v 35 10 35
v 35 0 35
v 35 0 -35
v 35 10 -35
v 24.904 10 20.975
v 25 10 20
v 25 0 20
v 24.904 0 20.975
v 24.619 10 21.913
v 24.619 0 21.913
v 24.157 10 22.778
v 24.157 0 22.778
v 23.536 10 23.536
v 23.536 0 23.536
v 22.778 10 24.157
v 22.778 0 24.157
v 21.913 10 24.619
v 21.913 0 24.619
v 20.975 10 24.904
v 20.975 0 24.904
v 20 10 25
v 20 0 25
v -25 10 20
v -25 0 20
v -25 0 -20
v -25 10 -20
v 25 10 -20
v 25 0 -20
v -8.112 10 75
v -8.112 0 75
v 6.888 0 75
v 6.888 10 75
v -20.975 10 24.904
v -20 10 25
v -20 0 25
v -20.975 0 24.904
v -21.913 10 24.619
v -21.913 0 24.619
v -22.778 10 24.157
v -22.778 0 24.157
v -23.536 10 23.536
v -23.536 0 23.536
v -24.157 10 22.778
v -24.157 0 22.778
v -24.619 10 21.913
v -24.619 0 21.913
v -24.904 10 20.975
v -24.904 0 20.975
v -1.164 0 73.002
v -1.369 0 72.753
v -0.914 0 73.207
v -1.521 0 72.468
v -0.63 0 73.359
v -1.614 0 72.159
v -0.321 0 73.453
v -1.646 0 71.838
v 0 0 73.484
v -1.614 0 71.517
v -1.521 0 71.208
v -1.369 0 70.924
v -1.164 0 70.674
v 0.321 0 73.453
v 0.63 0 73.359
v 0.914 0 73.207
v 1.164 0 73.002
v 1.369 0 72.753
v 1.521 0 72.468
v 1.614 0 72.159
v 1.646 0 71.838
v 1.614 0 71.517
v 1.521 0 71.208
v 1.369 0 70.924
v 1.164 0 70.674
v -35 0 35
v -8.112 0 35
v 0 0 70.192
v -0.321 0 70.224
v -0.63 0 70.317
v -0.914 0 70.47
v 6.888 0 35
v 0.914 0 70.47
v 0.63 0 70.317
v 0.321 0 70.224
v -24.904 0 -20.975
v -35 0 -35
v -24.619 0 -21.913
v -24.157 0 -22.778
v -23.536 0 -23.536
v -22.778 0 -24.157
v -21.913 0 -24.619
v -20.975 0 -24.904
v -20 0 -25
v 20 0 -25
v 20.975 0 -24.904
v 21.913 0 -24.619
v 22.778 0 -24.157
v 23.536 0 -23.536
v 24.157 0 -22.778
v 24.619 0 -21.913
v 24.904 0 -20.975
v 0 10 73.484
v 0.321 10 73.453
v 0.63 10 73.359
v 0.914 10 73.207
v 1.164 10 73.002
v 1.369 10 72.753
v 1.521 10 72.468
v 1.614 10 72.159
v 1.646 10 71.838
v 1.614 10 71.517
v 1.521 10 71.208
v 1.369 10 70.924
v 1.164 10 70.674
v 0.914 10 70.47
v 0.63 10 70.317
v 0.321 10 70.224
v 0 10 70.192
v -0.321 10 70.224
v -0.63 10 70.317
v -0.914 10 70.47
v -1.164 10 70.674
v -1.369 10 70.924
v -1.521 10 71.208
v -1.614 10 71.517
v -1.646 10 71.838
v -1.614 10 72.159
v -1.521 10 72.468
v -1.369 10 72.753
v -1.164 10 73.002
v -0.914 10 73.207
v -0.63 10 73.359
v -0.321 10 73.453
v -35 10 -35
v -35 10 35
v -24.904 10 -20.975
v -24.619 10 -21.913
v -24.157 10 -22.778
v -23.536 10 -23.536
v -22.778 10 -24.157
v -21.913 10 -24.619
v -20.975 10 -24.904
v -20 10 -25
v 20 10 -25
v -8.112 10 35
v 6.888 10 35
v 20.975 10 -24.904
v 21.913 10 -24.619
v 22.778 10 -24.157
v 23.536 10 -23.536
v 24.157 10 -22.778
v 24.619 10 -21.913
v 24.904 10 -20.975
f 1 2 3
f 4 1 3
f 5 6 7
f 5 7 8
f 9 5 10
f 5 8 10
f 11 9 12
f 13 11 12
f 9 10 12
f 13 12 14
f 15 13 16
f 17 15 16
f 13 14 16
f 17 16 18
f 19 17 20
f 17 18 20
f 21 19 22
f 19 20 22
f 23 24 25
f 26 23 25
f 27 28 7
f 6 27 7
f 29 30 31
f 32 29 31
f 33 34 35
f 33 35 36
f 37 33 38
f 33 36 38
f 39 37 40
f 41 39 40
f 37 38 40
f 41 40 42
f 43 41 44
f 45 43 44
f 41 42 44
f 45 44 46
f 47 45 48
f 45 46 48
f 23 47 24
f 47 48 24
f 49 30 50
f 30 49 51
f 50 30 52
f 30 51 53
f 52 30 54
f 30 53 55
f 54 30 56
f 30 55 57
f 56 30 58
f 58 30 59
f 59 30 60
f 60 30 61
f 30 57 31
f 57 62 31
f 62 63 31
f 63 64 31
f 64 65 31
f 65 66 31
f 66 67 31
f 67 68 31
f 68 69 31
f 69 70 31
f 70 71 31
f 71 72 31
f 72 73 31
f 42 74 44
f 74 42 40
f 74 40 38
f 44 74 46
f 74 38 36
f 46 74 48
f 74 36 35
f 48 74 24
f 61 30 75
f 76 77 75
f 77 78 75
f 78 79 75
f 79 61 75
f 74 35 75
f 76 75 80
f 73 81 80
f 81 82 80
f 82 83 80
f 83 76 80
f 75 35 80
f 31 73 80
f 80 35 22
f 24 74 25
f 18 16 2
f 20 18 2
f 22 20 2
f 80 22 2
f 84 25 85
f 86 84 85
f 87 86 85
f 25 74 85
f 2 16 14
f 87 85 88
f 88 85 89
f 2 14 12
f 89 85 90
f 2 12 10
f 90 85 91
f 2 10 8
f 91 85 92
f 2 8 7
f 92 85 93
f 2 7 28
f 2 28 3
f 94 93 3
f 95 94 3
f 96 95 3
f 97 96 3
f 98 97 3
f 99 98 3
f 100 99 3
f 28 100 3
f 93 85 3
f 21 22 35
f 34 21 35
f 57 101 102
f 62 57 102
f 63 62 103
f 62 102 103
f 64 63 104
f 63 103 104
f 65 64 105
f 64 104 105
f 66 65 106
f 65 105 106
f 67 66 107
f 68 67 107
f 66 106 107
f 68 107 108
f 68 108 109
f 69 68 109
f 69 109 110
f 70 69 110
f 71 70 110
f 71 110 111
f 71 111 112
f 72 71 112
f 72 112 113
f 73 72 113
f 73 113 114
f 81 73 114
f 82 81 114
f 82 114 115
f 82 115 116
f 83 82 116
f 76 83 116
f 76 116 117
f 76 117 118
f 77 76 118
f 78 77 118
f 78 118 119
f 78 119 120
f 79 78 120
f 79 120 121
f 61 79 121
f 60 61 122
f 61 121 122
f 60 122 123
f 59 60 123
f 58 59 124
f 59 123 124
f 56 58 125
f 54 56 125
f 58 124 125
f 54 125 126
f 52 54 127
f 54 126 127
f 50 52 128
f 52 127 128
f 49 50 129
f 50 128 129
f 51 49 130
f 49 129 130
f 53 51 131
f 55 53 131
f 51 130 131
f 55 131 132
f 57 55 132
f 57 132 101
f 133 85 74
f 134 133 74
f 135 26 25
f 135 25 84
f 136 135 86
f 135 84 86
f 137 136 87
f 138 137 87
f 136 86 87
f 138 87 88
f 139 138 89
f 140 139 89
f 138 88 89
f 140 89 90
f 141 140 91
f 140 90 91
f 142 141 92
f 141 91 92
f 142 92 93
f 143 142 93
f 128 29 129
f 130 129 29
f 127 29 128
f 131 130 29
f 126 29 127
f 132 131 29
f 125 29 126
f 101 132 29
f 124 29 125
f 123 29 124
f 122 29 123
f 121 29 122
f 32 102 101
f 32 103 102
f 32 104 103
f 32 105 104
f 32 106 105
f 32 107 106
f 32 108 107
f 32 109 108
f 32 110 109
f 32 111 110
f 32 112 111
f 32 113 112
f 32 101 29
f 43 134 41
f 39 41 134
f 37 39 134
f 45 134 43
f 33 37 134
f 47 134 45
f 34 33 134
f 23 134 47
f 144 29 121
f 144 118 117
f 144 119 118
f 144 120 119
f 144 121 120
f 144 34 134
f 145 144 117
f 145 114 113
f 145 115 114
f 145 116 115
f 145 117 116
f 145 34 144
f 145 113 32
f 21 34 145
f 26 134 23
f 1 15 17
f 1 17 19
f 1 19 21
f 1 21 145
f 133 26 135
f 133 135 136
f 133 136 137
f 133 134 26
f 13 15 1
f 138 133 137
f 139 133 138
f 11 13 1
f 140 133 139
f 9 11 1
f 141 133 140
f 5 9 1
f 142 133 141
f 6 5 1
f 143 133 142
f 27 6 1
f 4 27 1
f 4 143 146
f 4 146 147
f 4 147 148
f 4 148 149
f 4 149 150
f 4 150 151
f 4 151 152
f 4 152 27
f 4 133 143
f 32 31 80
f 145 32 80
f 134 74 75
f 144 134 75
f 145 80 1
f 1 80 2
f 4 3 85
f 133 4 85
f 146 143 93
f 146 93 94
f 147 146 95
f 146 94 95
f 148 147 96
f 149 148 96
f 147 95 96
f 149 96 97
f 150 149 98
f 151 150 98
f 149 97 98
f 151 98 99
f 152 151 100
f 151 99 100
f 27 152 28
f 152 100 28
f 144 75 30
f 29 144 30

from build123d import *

# Parameters (mm, degrees)
EXTRUDE_1_DEPTH     = 10
SKETCH_2_R          = 1.646034056
CUT_EXTRUDE_1_DEPTH = 84.366660003


with BuildPart() as part:
    # 草图1 → 凸台-拉伸1 (new body)
    with BuildSketch(Plane(origin=(0, 0, 0), x_dir=(1, 0, 0), z_dir=(0, 1, 0))):
        Polygon((-8.112254188, -35), (-8.112254188, -75), (6.887745812, -75), (6.887745812, -35), (35, -35), (35, 35), (-35, 35), (-35, -35), align=None)
        with BuildLine():
            Line((-20, 25), (20, 25))
            ThreePointArc((20, 25), (23.535533906, 23.535533906), (25, 20))
            Line((25, 20), (25, -20))
            ThreePointArc((25, -20), (23.535533906, -23.535533906), (20, -25))
            Line((20, -25), (-20, -25))
            ThreePointArc((-20, -25), (-23.535533906, -23.535533906), (-25, -20))
            Line((-25, -20), (-25, 20))
            ThreePointArc((-25, 20), (-23.535533906, 23.535533906), (-20, 25))
        make_face(mode=Mode.SUBTRACT)
    extrude(amount=EXTRUDE_1_DEPTH)

    # 草图2 → 切除-拉伸1 (cut, through all)
    with BuildSketch(Plane(origin=(0, 10, 0), x_dir=(1, 0, 0), z_dir=(0, 1, 0))):
        with Locations(Location((0, -71.838140911, 0), (0, 0, 270))):
            Circle(SKETCH_2_R)
    extrude(amount=-CUT_EXTRUDE_1_DEPTH, mode=Mode.SUBTRACT)


solid = part.part
